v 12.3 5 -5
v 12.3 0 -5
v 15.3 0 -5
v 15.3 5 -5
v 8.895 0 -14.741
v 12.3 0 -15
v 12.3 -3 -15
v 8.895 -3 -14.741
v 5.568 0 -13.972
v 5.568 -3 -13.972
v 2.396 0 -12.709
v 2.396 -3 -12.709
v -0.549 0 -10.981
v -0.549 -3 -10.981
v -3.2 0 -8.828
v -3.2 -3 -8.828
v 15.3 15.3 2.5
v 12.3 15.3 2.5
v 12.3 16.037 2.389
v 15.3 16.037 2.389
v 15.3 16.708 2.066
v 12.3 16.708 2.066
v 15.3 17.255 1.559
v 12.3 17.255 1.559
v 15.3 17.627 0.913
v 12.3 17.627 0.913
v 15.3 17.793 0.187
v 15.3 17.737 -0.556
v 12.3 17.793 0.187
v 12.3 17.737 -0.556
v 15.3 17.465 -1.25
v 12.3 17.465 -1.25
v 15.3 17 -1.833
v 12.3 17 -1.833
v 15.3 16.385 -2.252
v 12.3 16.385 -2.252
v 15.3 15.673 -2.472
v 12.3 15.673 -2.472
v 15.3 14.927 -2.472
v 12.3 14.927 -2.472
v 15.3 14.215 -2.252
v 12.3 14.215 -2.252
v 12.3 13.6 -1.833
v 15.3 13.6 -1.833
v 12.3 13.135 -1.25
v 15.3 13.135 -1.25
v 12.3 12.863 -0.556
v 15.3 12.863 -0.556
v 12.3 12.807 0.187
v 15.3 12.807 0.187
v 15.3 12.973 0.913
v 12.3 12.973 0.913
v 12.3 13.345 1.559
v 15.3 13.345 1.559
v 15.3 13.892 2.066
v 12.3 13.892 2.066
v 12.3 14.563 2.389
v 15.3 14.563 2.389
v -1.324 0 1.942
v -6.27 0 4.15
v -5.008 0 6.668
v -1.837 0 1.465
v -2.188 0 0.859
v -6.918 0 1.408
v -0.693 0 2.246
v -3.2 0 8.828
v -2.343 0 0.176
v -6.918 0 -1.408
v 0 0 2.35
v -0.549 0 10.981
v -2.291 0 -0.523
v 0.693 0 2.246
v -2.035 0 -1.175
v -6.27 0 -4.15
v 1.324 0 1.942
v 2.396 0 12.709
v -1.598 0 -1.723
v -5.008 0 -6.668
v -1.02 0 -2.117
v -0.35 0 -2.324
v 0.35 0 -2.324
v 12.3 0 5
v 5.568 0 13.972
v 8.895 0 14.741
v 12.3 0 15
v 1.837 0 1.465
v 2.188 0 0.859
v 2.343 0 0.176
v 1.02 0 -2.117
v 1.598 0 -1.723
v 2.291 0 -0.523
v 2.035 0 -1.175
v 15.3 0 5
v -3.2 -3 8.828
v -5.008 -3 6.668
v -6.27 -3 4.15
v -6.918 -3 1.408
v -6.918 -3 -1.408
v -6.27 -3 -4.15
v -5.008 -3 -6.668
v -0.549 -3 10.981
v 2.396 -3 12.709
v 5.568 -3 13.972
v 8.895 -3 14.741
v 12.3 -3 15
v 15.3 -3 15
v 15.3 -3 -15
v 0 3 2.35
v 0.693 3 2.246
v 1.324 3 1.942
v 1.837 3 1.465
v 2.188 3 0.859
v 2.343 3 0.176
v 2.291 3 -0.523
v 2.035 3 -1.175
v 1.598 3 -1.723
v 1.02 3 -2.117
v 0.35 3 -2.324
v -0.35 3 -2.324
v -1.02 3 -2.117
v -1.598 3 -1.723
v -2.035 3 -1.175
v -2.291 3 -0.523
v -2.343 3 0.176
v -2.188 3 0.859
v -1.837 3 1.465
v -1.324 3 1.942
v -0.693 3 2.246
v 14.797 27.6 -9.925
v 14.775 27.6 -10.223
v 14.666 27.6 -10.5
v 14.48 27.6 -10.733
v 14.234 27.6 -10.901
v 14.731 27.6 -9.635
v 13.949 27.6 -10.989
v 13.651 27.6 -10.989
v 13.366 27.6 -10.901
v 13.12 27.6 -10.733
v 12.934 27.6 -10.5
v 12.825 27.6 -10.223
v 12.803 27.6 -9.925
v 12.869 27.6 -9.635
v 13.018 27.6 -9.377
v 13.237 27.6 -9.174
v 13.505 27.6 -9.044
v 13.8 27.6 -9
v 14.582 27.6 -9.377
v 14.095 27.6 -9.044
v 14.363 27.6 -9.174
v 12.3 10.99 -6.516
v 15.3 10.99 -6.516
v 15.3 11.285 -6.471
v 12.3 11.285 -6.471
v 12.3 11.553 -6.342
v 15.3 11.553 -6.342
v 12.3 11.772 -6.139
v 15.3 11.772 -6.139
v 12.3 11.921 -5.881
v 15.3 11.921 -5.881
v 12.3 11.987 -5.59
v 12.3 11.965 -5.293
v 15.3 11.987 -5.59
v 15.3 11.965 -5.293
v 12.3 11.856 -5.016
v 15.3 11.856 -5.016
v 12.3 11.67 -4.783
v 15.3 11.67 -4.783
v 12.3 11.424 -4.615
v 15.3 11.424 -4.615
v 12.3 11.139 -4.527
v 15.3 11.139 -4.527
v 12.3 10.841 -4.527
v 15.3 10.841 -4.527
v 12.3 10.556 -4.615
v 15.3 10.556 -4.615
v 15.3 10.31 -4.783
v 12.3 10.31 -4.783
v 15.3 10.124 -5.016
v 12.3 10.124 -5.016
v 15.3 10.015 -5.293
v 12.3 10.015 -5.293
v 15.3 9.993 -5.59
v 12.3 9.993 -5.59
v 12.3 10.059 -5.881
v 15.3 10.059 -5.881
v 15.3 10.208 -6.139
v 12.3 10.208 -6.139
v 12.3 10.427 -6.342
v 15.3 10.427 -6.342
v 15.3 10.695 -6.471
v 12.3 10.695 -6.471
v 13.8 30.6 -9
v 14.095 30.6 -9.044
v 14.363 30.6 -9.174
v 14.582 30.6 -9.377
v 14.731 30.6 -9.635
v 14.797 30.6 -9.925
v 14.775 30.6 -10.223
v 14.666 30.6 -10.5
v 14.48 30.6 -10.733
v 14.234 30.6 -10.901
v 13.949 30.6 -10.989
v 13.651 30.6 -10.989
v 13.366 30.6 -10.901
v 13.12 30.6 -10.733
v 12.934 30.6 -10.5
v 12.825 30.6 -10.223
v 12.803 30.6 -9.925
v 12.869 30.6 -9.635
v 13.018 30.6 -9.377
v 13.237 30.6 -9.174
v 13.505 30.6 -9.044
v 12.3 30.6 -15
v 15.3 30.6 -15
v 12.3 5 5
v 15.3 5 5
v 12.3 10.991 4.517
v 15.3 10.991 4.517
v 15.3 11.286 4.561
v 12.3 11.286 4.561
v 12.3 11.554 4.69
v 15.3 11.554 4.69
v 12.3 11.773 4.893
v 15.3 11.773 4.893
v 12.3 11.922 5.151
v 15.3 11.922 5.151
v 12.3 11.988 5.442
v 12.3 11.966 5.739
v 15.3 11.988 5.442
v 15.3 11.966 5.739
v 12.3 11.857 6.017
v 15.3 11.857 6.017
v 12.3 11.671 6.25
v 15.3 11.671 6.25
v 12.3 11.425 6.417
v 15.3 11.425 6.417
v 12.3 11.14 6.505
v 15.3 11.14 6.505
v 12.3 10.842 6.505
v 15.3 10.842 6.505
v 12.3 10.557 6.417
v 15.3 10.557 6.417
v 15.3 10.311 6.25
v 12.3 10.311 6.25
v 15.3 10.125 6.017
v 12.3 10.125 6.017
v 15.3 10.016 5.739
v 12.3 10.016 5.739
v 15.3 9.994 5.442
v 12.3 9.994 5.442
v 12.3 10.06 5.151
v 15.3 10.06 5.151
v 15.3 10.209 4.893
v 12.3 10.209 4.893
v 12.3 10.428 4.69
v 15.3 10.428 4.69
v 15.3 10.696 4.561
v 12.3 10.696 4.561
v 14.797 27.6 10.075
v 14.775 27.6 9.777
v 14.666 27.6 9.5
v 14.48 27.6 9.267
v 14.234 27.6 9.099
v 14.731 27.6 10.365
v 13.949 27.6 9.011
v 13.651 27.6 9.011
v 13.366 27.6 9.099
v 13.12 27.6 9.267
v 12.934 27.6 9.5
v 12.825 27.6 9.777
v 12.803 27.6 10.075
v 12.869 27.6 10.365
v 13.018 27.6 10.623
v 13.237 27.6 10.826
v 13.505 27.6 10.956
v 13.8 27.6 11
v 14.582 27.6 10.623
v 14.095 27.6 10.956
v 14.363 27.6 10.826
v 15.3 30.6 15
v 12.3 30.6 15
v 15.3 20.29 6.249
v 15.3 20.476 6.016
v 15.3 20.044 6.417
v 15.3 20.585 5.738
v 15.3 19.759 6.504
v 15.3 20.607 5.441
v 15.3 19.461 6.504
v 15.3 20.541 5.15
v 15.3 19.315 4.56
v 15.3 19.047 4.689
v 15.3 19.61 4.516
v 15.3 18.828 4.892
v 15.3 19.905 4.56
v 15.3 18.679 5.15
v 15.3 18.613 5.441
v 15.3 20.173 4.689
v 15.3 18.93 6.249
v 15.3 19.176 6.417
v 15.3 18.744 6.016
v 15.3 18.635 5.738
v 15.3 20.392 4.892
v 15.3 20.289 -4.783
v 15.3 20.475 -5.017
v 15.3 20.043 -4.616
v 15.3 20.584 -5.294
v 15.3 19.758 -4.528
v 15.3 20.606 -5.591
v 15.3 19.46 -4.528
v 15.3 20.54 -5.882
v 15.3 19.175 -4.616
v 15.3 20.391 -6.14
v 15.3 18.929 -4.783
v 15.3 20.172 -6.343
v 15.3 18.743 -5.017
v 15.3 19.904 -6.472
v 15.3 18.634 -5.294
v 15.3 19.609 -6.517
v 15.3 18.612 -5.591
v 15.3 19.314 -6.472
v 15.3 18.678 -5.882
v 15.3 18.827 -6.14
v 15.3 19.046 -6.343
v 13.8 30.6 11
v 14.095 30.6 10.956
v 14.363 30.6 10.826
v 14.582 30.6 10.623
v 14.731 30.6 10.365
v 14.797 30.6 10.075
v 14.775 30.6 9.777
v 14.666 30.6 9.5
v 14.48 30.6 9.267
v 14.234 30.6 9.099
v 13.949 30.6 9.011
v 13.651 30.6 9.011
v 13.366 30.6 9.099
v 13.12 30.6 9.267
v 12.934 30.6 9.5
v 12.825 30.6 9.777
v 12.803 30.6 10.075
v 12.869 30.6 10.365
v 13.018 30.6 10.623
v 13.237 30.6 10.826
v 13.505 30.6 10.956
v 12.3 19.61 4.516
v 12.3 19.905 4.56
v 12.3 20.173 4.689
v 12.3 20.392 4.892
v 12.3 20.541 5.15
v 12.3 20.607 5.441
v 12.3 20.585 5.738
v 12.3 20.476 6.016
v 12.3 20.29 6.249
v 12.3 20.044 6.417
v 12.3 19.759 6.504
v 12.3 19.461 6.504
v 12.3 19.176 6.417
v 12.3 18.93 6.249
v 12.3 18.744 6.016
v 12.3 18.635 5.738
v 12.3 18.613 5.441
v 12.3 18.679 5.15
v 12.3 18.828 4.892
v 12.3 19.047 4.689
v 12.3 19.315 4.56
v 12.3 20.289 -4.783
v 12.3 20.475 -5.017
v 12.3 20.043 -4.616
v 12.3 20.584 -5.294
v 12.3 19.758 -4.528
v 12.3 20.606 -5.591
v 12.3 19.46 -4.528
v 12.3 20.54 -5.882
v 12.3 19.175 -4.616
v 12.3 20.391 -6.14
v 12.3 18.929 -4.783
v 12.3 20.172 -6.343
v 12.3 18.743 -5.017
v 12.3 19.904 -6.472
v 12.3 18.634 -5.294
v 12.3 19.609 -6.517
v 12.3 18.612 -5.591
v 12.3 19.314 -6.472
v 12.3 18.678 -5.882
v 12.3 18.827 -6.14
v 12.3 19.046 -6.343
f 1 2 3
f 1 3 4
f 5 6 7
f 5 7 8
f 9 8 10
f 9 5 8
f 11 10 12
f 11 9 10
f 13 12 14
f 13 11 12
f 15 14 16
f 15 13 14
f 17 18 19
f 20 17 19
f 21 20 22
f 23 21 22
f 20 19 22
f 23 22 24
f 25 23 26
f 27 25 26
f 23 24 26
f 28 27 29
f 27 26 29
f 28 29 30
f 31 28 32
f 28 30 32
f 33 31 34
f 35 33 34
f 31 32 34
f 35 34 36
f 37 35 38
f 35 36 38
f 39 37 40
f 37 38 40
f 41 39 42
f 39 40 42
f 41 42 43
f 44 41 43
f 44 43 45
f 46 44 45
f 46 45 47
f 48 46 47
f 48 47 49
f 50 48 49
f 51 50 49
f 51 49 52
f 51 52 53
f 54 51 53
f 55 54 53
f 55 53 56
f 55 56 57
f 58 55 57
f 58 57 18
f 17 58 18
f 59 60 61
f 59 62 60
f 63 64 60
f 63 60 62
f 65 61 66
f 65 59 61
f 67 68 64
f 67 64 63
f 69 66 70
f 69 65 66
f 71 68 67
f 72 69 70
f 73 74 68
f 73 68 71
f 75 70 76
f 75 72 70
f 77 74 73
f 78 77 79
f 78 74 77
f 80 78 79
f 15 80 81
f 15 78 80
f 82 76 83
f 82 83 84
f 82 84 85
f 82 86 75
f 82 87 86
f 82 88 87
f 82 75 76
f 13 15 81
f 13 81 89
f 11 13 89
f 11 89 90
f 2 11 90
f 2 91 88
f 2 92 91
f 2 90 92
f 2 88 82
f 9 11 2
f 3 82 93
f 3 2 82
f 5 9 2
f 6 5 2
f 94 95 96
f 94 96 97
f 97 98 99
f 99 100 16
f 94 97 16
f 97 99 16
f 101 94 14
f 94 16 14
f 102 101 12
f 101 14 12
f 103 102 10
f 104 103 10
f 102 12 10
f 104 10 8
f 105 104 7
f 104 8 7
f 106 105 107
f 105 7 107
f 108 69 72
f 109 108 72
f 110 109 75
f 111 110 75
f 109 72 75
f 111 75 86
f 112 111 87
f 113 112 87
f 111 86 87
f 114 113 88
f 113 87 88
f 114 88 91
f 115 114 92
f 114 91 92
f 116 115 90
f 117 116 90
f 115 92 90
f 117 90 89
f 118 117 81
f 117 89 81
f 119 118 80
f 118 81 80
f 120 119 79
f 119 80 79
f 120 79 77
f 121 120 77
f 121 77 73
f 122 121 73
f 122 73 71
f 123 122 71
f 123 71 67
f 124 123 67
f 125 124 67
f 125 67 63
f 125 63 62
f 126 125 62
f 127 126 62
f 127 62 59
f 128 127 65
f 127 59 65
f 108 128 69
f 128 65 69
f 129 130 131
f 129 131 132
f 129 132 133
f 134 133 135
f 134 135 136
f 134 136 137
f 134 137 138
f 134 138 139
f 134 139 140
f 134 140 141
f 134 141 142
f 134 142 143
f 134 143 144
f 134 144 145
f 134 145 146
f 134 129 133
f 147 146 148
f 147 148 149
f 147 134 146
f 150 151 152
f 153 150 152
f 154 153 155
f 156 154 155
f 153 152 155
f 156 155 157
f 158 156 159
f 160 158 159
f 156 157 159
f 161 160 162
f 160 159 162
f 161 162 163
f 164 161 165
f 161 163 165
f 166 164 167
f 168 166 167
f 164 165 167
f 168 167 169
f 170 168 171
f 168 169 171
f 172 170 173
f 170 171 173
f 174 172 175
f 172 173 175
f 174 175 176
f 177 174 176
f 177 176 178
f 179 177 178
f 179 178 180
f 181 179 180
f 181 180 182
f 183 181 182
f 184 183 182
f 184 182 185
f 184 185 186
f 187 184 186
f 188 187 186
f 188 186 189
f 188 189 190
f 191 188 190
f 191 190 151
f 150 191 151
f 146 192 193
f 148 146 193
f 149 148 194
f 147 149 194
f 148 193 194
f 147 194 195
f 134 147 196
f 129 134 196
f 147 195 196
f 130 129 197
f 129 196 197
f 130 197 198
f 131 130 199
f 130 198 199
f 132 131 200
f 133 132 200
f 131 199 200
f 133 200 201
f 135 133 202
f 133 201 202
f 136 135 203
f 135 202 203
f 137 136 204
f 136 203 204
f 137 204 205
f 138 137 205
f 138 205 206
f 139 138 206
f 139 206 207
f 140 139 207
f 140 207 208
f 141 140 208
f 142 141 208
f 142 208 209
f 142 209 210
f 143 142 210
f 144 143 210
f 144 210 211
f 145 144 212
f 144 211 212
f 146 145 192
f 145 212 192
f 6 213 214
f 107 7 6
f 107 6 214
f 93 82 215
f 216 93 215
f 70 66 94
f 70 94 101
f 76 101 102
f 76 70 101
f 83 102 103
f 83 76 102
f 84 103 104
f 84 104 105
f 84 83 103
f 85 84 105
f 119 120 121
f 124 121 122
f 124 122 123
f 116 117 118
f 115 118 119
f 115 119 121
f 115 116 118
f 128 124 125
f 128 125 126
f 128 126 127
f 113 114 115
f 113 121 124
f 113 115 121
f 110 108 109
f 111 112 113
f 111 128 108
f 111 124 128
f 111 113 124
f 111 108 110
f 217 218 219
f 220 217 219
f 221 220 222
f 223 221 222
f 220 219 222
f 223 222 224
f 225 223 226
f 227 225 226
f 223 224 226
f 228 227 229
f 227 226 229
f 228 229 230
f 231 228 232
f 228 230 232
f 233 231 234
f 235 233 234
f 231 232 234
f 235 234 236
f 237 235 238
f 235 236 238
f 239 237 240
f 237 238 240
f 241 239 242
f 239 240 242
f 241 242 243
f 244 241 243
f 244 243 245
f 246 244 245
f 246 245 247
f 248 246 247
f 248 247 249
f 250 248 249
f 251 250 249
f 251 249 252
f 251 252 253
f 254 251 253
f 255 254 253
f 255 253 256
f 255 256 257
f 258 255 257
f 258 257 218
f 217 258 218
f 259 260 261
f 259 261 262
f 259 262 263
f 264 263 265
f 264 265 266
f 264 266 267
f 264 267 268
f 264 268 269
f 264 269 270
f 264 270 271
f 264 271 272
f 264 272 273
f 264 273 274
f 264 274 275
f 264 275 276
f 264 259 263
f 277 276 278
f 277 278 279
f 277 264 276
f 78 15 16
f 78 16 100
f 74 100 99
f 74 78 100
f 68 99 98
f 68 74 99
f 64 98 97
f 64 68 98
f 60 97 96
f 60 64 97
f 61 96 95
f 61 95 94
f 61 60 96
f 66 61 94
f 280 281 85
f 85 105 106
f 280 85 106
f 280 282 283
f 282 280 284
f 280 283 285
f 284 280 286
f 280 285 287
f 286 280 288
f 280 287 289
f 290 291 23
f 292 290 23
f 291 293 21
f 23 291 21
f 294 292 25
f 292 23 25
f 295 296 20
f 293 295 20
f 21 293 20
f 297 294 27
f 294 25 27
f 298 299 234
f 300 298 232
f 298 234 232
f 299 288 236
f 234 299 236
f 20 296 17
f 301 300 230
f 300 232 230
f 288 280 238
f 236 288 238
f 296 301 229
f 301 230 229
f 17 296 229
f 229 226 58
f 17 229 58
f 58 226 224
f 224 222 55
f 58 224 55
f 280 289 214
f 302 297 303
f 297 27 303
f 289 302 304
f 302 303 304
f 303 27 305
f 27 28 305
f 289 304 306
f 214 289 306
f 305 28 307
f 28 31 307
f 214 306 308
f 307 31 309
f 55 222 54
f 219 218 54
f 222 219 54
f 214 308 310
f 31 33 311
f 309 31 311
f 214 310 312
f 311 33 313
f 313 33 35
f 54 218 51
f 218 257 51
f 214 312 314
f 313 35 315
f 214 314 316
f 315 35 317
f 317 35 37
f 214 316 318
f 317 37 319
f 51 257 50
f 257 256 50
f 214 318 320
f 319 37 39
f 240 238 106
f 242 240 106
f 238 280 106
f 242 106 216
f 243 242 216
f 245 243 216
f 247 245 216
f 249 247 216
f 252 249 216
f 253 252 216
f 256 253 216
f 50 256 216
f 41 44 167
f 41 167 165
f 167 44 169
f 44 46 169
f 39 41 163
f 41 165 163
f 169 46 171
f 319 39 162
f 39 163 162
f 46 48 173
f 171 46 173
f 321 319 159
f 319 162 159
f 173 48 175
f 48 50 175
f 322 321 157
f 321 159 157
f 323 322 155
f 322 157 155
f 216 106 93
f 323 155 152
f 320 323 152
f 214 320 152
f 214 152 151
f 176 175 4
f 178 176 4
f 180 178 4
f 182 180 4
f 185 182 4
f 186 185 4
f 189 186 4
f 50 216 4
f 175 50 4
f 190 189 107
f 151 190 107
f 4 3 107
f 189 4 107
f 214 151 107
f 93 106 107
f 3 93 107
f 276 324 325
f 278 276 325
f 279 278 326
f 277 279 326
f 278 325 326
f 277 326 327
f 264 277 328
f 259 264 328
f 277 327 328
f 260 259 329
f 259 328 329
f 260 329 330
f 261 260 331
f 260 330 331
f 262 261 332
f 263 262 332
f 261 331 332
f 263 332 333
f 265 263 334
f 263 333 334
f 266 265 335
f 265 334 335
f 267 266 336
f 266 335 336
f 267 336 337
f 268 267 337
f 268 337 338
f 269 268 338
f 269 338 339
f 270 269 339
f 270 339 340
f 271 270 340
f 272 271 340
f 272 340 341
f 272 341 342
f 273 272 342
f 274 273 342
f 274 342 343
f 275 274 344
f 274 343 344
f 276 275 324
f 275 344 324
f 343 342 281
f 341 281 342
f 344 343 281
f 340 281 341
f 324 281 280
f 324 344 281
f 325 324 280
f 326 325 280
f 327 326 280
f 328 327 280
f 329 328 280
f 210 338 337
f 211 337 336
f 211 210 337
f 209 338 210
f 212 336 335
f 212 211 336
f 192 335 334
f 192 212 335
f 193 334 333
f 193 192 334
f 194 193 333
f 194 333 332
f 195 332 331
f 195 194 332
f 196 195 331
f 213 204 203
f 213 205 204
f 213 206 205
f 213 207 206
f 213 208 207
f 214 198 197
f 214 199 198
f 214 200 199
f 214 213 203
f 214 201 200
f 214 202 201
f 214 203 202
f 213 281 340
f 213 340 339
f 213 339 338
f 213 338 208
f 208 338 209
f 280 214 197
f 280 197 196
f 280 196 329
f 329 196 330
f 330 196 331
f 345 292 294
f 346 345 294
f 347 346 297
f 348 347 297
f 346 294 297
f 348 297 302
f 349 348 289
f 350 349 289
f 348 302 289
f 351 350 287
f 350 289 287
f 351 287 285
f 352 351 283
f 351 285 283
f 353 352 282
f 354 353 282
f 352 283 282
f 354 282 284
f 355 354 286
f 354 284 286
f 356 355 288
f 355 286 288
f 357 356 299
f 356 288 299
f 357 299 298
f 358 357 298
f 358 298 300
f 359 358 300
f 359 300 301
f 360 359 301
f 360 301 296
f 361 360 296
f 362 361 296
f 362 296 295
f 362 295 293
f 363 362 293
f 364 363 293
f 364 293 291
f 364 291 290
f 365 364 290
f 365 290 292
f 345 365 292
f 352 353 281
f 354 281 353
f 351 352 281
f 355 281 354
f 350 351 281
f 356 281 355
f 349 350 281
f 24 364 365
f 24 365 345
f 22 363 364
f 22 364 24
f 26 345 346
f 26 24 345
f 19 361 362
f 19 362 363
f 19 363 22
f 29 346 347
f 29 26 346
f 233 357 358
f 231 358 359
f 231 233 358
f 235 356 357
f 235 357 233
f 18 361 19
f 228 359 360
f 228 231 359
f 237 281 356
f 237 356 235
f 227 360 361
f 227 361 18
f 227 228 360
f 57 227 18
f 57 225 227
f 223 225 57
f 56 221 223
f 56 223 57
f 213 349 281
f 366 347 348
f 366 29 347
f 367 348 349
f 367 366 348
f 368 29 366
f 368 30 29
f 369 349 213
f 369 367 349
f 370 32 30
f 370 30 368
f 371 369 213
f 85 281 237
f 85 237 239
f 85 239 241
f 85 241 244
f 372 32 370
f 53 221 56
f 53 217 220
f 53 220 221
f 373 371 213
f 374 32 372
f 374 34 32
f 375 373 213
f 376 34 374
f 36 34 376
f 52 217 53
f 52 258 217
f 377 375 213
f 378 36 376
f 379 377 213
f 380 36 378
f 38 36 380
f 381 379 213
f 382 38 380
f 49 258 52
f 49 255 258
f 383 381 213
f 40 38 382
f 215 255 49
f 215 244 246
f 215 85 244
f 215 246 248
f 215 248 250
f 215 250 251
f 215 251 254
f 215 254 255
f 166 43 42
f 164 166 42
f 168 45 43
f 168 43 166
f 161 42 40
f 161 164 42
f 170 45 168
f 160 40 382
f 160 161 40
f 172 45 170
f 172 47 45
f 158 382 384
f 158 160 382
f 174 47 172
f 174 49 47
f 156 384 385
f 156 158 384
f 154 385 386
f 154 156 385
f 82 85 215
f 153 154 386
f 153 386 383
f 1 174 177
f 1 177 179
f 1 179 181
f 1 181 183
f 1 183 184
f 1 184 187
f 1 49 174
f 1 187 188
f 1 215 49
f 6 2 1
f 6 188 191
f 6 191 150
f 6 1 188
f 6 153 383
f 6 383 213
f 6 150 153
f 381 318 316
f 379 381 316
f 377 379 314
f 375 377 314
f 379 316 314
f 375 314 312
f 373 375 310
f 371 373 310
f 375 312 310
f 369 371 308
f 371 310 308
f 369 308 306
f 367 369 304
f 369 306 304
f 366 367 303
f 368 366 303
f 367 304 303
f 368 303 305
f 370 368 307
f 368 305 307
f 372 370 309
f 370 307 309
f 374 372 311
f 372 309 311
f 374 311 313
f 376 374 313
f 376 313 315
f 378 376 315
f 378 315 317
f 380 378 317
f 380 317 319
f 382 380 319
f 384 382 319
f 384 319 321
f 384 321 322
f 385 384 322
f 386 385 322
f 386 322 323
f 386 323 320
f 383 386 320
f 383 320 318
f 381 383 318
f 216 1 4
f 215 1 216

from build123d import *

# Parameters (mm, degrees)
BOSS_EXTRUDE1_DEPTH     = 3
ESQUISSE1_W             = 3
ESQUISSE1_H             = 30
BOSS_EXTRU_1_DEPTH      = 30.6
ESQUISSE2_R             = 1
ENL_V_MAT_EXTRU_1_DEPTH = 3
ESQUISSE3_R             = 2.35
BOSS_EXTRU_2_DEPTH      = 3
ESQUISSE4_R             = 2.5
ENL_V_MAT_EXTRU_2_DEPTH = 40.164397097
ESQUISSE5_R             = 1
ENL_V_MAT_EXTRU_3_DEPTH = 10
SKETCH2_W               = 10
SKETCH2_H               = 5
CUT_EXTRUDE1_DEPTH      = 40.164397097


with BuildPart() as part:
    # Sketch1 → Boss-Extrude1 (new body)
    with BuildSketch(Plane(origin=(0, 0, 0), x_dir=(1, 0, 0), z_dir=(0, 1, 0))):
        with BuildLine():
            Line((15.3, 15), (12.3, 15))
            ThreePointArc((12.3, 15), (3.958234572, 13.40032808), (-3.2, 8.828273999))
            ThreePointArc((-3.2, 8.828273999), (-7, 0), (-3.2, -8.828273999))
            ThreePointArc((-3.2, -8.828273999), (3.958234572, -13.40032808), (12.3, -15))
            Line((12.3, -15), (15.3, -15))
            Line((15.3, -15), (15.3, 15))
        make_face()
    extrude(amount=-BOSS_EXTRUDE1_DEPTH)

    # Esquisse1 → Boss.-Extru.1 (add)
    with BuildSketch(Plane(origin=(0, 0, 0), x_dir=(1, 0, 0), z_dir=(0, 1, 0))):
        with Locations((13.8, 0)):
            Rectangle(ESQUISSE1_W, ESQUISSE1_H)
    extrude(amount=BOSS_EXTRU_1_DEPTH)

    # Esquisse2 → Enlèv. mat.-Extru.1 (cut)
    with BuildSketch(Plane(origin=(0, 30.6, 0), x_dir=(1, 0, 0), z_dir=(0, 1, 0))):
        with Locations(Location((13.8, 10, 0), (0, 0, 270))):
            Circle(ESQUISSE2_R)
        with Locations(Location((13.8, -10, 0), (0, 0, 270))):
            Circle(ESQUISSE2_R)
    extrude(amount=-ENL_V_MAT_EXTRU_1_DEPTH, mode=Mode.SUBTRACT)

    # Esquisse3 → Boss.-Extru.2 (add)
    with BuildSketch(Plane(origin=(0, 0, 0), x_dir=(1, 0, 0), z_dir=(0, 1, 0))):
        with Locations(Location((0, 0, 0), (0, 0, 270))):
            Circle(ESQUISSE3_R)
    extrude(amount=BOSS_EXTRU_2_DEPTH)

    # Esquisse4 → Enlèv. mat.-Extru.2 (cut, through all)
    with BuildSketch(Plane.ZY.offset(-12.3)):
        with Locations((0, 15.3)):
            Circle(ESQUISSE4_R)
    extrude(amount=-ENL_V_MAT_EXTRU_2_DEPTH, mode=Mode.SUBTRACT)

    # Esquisse5 → Enlèv. mat.-Extru.3 (cut)
    with BuildSketch(Plane(origin=(15.3, 0, 0), x_dir=(0, 0, -1), z_dir=(1, 0, 0))):
        with Locations((5.516503864, 19.609081703)):
            Circle(ESQUISSE5_R)
        with Locations((5.515646632, 10.989821091)):
            Circle(ESQUISSE5_R)
        with Locations((-5.515646632, 19.610178909)):
            Circle(ESQUISSE5_R)
        with Locations((-5.516503864, 10.990918297)):
            Circle(ESQUISSE5_R)
    extrude(amount=-ENL_V_MAT_EXTRU_3_DEPTH, mode=Mode.SUBTRACT)

    # Sketch2 → Cut-Extrude1 (cut, through all)
    with BuildSketch(Plane.ZY.offset(-12.3)):
        with Locations((0, 2.5)):
            Rectangle(SKETCH2_W, SKETCH2_H)
    extrude(amount=-CUT_EXTRUDE1_DEPTH, mode=Mode.SUBTRACT)


solid = part.part
